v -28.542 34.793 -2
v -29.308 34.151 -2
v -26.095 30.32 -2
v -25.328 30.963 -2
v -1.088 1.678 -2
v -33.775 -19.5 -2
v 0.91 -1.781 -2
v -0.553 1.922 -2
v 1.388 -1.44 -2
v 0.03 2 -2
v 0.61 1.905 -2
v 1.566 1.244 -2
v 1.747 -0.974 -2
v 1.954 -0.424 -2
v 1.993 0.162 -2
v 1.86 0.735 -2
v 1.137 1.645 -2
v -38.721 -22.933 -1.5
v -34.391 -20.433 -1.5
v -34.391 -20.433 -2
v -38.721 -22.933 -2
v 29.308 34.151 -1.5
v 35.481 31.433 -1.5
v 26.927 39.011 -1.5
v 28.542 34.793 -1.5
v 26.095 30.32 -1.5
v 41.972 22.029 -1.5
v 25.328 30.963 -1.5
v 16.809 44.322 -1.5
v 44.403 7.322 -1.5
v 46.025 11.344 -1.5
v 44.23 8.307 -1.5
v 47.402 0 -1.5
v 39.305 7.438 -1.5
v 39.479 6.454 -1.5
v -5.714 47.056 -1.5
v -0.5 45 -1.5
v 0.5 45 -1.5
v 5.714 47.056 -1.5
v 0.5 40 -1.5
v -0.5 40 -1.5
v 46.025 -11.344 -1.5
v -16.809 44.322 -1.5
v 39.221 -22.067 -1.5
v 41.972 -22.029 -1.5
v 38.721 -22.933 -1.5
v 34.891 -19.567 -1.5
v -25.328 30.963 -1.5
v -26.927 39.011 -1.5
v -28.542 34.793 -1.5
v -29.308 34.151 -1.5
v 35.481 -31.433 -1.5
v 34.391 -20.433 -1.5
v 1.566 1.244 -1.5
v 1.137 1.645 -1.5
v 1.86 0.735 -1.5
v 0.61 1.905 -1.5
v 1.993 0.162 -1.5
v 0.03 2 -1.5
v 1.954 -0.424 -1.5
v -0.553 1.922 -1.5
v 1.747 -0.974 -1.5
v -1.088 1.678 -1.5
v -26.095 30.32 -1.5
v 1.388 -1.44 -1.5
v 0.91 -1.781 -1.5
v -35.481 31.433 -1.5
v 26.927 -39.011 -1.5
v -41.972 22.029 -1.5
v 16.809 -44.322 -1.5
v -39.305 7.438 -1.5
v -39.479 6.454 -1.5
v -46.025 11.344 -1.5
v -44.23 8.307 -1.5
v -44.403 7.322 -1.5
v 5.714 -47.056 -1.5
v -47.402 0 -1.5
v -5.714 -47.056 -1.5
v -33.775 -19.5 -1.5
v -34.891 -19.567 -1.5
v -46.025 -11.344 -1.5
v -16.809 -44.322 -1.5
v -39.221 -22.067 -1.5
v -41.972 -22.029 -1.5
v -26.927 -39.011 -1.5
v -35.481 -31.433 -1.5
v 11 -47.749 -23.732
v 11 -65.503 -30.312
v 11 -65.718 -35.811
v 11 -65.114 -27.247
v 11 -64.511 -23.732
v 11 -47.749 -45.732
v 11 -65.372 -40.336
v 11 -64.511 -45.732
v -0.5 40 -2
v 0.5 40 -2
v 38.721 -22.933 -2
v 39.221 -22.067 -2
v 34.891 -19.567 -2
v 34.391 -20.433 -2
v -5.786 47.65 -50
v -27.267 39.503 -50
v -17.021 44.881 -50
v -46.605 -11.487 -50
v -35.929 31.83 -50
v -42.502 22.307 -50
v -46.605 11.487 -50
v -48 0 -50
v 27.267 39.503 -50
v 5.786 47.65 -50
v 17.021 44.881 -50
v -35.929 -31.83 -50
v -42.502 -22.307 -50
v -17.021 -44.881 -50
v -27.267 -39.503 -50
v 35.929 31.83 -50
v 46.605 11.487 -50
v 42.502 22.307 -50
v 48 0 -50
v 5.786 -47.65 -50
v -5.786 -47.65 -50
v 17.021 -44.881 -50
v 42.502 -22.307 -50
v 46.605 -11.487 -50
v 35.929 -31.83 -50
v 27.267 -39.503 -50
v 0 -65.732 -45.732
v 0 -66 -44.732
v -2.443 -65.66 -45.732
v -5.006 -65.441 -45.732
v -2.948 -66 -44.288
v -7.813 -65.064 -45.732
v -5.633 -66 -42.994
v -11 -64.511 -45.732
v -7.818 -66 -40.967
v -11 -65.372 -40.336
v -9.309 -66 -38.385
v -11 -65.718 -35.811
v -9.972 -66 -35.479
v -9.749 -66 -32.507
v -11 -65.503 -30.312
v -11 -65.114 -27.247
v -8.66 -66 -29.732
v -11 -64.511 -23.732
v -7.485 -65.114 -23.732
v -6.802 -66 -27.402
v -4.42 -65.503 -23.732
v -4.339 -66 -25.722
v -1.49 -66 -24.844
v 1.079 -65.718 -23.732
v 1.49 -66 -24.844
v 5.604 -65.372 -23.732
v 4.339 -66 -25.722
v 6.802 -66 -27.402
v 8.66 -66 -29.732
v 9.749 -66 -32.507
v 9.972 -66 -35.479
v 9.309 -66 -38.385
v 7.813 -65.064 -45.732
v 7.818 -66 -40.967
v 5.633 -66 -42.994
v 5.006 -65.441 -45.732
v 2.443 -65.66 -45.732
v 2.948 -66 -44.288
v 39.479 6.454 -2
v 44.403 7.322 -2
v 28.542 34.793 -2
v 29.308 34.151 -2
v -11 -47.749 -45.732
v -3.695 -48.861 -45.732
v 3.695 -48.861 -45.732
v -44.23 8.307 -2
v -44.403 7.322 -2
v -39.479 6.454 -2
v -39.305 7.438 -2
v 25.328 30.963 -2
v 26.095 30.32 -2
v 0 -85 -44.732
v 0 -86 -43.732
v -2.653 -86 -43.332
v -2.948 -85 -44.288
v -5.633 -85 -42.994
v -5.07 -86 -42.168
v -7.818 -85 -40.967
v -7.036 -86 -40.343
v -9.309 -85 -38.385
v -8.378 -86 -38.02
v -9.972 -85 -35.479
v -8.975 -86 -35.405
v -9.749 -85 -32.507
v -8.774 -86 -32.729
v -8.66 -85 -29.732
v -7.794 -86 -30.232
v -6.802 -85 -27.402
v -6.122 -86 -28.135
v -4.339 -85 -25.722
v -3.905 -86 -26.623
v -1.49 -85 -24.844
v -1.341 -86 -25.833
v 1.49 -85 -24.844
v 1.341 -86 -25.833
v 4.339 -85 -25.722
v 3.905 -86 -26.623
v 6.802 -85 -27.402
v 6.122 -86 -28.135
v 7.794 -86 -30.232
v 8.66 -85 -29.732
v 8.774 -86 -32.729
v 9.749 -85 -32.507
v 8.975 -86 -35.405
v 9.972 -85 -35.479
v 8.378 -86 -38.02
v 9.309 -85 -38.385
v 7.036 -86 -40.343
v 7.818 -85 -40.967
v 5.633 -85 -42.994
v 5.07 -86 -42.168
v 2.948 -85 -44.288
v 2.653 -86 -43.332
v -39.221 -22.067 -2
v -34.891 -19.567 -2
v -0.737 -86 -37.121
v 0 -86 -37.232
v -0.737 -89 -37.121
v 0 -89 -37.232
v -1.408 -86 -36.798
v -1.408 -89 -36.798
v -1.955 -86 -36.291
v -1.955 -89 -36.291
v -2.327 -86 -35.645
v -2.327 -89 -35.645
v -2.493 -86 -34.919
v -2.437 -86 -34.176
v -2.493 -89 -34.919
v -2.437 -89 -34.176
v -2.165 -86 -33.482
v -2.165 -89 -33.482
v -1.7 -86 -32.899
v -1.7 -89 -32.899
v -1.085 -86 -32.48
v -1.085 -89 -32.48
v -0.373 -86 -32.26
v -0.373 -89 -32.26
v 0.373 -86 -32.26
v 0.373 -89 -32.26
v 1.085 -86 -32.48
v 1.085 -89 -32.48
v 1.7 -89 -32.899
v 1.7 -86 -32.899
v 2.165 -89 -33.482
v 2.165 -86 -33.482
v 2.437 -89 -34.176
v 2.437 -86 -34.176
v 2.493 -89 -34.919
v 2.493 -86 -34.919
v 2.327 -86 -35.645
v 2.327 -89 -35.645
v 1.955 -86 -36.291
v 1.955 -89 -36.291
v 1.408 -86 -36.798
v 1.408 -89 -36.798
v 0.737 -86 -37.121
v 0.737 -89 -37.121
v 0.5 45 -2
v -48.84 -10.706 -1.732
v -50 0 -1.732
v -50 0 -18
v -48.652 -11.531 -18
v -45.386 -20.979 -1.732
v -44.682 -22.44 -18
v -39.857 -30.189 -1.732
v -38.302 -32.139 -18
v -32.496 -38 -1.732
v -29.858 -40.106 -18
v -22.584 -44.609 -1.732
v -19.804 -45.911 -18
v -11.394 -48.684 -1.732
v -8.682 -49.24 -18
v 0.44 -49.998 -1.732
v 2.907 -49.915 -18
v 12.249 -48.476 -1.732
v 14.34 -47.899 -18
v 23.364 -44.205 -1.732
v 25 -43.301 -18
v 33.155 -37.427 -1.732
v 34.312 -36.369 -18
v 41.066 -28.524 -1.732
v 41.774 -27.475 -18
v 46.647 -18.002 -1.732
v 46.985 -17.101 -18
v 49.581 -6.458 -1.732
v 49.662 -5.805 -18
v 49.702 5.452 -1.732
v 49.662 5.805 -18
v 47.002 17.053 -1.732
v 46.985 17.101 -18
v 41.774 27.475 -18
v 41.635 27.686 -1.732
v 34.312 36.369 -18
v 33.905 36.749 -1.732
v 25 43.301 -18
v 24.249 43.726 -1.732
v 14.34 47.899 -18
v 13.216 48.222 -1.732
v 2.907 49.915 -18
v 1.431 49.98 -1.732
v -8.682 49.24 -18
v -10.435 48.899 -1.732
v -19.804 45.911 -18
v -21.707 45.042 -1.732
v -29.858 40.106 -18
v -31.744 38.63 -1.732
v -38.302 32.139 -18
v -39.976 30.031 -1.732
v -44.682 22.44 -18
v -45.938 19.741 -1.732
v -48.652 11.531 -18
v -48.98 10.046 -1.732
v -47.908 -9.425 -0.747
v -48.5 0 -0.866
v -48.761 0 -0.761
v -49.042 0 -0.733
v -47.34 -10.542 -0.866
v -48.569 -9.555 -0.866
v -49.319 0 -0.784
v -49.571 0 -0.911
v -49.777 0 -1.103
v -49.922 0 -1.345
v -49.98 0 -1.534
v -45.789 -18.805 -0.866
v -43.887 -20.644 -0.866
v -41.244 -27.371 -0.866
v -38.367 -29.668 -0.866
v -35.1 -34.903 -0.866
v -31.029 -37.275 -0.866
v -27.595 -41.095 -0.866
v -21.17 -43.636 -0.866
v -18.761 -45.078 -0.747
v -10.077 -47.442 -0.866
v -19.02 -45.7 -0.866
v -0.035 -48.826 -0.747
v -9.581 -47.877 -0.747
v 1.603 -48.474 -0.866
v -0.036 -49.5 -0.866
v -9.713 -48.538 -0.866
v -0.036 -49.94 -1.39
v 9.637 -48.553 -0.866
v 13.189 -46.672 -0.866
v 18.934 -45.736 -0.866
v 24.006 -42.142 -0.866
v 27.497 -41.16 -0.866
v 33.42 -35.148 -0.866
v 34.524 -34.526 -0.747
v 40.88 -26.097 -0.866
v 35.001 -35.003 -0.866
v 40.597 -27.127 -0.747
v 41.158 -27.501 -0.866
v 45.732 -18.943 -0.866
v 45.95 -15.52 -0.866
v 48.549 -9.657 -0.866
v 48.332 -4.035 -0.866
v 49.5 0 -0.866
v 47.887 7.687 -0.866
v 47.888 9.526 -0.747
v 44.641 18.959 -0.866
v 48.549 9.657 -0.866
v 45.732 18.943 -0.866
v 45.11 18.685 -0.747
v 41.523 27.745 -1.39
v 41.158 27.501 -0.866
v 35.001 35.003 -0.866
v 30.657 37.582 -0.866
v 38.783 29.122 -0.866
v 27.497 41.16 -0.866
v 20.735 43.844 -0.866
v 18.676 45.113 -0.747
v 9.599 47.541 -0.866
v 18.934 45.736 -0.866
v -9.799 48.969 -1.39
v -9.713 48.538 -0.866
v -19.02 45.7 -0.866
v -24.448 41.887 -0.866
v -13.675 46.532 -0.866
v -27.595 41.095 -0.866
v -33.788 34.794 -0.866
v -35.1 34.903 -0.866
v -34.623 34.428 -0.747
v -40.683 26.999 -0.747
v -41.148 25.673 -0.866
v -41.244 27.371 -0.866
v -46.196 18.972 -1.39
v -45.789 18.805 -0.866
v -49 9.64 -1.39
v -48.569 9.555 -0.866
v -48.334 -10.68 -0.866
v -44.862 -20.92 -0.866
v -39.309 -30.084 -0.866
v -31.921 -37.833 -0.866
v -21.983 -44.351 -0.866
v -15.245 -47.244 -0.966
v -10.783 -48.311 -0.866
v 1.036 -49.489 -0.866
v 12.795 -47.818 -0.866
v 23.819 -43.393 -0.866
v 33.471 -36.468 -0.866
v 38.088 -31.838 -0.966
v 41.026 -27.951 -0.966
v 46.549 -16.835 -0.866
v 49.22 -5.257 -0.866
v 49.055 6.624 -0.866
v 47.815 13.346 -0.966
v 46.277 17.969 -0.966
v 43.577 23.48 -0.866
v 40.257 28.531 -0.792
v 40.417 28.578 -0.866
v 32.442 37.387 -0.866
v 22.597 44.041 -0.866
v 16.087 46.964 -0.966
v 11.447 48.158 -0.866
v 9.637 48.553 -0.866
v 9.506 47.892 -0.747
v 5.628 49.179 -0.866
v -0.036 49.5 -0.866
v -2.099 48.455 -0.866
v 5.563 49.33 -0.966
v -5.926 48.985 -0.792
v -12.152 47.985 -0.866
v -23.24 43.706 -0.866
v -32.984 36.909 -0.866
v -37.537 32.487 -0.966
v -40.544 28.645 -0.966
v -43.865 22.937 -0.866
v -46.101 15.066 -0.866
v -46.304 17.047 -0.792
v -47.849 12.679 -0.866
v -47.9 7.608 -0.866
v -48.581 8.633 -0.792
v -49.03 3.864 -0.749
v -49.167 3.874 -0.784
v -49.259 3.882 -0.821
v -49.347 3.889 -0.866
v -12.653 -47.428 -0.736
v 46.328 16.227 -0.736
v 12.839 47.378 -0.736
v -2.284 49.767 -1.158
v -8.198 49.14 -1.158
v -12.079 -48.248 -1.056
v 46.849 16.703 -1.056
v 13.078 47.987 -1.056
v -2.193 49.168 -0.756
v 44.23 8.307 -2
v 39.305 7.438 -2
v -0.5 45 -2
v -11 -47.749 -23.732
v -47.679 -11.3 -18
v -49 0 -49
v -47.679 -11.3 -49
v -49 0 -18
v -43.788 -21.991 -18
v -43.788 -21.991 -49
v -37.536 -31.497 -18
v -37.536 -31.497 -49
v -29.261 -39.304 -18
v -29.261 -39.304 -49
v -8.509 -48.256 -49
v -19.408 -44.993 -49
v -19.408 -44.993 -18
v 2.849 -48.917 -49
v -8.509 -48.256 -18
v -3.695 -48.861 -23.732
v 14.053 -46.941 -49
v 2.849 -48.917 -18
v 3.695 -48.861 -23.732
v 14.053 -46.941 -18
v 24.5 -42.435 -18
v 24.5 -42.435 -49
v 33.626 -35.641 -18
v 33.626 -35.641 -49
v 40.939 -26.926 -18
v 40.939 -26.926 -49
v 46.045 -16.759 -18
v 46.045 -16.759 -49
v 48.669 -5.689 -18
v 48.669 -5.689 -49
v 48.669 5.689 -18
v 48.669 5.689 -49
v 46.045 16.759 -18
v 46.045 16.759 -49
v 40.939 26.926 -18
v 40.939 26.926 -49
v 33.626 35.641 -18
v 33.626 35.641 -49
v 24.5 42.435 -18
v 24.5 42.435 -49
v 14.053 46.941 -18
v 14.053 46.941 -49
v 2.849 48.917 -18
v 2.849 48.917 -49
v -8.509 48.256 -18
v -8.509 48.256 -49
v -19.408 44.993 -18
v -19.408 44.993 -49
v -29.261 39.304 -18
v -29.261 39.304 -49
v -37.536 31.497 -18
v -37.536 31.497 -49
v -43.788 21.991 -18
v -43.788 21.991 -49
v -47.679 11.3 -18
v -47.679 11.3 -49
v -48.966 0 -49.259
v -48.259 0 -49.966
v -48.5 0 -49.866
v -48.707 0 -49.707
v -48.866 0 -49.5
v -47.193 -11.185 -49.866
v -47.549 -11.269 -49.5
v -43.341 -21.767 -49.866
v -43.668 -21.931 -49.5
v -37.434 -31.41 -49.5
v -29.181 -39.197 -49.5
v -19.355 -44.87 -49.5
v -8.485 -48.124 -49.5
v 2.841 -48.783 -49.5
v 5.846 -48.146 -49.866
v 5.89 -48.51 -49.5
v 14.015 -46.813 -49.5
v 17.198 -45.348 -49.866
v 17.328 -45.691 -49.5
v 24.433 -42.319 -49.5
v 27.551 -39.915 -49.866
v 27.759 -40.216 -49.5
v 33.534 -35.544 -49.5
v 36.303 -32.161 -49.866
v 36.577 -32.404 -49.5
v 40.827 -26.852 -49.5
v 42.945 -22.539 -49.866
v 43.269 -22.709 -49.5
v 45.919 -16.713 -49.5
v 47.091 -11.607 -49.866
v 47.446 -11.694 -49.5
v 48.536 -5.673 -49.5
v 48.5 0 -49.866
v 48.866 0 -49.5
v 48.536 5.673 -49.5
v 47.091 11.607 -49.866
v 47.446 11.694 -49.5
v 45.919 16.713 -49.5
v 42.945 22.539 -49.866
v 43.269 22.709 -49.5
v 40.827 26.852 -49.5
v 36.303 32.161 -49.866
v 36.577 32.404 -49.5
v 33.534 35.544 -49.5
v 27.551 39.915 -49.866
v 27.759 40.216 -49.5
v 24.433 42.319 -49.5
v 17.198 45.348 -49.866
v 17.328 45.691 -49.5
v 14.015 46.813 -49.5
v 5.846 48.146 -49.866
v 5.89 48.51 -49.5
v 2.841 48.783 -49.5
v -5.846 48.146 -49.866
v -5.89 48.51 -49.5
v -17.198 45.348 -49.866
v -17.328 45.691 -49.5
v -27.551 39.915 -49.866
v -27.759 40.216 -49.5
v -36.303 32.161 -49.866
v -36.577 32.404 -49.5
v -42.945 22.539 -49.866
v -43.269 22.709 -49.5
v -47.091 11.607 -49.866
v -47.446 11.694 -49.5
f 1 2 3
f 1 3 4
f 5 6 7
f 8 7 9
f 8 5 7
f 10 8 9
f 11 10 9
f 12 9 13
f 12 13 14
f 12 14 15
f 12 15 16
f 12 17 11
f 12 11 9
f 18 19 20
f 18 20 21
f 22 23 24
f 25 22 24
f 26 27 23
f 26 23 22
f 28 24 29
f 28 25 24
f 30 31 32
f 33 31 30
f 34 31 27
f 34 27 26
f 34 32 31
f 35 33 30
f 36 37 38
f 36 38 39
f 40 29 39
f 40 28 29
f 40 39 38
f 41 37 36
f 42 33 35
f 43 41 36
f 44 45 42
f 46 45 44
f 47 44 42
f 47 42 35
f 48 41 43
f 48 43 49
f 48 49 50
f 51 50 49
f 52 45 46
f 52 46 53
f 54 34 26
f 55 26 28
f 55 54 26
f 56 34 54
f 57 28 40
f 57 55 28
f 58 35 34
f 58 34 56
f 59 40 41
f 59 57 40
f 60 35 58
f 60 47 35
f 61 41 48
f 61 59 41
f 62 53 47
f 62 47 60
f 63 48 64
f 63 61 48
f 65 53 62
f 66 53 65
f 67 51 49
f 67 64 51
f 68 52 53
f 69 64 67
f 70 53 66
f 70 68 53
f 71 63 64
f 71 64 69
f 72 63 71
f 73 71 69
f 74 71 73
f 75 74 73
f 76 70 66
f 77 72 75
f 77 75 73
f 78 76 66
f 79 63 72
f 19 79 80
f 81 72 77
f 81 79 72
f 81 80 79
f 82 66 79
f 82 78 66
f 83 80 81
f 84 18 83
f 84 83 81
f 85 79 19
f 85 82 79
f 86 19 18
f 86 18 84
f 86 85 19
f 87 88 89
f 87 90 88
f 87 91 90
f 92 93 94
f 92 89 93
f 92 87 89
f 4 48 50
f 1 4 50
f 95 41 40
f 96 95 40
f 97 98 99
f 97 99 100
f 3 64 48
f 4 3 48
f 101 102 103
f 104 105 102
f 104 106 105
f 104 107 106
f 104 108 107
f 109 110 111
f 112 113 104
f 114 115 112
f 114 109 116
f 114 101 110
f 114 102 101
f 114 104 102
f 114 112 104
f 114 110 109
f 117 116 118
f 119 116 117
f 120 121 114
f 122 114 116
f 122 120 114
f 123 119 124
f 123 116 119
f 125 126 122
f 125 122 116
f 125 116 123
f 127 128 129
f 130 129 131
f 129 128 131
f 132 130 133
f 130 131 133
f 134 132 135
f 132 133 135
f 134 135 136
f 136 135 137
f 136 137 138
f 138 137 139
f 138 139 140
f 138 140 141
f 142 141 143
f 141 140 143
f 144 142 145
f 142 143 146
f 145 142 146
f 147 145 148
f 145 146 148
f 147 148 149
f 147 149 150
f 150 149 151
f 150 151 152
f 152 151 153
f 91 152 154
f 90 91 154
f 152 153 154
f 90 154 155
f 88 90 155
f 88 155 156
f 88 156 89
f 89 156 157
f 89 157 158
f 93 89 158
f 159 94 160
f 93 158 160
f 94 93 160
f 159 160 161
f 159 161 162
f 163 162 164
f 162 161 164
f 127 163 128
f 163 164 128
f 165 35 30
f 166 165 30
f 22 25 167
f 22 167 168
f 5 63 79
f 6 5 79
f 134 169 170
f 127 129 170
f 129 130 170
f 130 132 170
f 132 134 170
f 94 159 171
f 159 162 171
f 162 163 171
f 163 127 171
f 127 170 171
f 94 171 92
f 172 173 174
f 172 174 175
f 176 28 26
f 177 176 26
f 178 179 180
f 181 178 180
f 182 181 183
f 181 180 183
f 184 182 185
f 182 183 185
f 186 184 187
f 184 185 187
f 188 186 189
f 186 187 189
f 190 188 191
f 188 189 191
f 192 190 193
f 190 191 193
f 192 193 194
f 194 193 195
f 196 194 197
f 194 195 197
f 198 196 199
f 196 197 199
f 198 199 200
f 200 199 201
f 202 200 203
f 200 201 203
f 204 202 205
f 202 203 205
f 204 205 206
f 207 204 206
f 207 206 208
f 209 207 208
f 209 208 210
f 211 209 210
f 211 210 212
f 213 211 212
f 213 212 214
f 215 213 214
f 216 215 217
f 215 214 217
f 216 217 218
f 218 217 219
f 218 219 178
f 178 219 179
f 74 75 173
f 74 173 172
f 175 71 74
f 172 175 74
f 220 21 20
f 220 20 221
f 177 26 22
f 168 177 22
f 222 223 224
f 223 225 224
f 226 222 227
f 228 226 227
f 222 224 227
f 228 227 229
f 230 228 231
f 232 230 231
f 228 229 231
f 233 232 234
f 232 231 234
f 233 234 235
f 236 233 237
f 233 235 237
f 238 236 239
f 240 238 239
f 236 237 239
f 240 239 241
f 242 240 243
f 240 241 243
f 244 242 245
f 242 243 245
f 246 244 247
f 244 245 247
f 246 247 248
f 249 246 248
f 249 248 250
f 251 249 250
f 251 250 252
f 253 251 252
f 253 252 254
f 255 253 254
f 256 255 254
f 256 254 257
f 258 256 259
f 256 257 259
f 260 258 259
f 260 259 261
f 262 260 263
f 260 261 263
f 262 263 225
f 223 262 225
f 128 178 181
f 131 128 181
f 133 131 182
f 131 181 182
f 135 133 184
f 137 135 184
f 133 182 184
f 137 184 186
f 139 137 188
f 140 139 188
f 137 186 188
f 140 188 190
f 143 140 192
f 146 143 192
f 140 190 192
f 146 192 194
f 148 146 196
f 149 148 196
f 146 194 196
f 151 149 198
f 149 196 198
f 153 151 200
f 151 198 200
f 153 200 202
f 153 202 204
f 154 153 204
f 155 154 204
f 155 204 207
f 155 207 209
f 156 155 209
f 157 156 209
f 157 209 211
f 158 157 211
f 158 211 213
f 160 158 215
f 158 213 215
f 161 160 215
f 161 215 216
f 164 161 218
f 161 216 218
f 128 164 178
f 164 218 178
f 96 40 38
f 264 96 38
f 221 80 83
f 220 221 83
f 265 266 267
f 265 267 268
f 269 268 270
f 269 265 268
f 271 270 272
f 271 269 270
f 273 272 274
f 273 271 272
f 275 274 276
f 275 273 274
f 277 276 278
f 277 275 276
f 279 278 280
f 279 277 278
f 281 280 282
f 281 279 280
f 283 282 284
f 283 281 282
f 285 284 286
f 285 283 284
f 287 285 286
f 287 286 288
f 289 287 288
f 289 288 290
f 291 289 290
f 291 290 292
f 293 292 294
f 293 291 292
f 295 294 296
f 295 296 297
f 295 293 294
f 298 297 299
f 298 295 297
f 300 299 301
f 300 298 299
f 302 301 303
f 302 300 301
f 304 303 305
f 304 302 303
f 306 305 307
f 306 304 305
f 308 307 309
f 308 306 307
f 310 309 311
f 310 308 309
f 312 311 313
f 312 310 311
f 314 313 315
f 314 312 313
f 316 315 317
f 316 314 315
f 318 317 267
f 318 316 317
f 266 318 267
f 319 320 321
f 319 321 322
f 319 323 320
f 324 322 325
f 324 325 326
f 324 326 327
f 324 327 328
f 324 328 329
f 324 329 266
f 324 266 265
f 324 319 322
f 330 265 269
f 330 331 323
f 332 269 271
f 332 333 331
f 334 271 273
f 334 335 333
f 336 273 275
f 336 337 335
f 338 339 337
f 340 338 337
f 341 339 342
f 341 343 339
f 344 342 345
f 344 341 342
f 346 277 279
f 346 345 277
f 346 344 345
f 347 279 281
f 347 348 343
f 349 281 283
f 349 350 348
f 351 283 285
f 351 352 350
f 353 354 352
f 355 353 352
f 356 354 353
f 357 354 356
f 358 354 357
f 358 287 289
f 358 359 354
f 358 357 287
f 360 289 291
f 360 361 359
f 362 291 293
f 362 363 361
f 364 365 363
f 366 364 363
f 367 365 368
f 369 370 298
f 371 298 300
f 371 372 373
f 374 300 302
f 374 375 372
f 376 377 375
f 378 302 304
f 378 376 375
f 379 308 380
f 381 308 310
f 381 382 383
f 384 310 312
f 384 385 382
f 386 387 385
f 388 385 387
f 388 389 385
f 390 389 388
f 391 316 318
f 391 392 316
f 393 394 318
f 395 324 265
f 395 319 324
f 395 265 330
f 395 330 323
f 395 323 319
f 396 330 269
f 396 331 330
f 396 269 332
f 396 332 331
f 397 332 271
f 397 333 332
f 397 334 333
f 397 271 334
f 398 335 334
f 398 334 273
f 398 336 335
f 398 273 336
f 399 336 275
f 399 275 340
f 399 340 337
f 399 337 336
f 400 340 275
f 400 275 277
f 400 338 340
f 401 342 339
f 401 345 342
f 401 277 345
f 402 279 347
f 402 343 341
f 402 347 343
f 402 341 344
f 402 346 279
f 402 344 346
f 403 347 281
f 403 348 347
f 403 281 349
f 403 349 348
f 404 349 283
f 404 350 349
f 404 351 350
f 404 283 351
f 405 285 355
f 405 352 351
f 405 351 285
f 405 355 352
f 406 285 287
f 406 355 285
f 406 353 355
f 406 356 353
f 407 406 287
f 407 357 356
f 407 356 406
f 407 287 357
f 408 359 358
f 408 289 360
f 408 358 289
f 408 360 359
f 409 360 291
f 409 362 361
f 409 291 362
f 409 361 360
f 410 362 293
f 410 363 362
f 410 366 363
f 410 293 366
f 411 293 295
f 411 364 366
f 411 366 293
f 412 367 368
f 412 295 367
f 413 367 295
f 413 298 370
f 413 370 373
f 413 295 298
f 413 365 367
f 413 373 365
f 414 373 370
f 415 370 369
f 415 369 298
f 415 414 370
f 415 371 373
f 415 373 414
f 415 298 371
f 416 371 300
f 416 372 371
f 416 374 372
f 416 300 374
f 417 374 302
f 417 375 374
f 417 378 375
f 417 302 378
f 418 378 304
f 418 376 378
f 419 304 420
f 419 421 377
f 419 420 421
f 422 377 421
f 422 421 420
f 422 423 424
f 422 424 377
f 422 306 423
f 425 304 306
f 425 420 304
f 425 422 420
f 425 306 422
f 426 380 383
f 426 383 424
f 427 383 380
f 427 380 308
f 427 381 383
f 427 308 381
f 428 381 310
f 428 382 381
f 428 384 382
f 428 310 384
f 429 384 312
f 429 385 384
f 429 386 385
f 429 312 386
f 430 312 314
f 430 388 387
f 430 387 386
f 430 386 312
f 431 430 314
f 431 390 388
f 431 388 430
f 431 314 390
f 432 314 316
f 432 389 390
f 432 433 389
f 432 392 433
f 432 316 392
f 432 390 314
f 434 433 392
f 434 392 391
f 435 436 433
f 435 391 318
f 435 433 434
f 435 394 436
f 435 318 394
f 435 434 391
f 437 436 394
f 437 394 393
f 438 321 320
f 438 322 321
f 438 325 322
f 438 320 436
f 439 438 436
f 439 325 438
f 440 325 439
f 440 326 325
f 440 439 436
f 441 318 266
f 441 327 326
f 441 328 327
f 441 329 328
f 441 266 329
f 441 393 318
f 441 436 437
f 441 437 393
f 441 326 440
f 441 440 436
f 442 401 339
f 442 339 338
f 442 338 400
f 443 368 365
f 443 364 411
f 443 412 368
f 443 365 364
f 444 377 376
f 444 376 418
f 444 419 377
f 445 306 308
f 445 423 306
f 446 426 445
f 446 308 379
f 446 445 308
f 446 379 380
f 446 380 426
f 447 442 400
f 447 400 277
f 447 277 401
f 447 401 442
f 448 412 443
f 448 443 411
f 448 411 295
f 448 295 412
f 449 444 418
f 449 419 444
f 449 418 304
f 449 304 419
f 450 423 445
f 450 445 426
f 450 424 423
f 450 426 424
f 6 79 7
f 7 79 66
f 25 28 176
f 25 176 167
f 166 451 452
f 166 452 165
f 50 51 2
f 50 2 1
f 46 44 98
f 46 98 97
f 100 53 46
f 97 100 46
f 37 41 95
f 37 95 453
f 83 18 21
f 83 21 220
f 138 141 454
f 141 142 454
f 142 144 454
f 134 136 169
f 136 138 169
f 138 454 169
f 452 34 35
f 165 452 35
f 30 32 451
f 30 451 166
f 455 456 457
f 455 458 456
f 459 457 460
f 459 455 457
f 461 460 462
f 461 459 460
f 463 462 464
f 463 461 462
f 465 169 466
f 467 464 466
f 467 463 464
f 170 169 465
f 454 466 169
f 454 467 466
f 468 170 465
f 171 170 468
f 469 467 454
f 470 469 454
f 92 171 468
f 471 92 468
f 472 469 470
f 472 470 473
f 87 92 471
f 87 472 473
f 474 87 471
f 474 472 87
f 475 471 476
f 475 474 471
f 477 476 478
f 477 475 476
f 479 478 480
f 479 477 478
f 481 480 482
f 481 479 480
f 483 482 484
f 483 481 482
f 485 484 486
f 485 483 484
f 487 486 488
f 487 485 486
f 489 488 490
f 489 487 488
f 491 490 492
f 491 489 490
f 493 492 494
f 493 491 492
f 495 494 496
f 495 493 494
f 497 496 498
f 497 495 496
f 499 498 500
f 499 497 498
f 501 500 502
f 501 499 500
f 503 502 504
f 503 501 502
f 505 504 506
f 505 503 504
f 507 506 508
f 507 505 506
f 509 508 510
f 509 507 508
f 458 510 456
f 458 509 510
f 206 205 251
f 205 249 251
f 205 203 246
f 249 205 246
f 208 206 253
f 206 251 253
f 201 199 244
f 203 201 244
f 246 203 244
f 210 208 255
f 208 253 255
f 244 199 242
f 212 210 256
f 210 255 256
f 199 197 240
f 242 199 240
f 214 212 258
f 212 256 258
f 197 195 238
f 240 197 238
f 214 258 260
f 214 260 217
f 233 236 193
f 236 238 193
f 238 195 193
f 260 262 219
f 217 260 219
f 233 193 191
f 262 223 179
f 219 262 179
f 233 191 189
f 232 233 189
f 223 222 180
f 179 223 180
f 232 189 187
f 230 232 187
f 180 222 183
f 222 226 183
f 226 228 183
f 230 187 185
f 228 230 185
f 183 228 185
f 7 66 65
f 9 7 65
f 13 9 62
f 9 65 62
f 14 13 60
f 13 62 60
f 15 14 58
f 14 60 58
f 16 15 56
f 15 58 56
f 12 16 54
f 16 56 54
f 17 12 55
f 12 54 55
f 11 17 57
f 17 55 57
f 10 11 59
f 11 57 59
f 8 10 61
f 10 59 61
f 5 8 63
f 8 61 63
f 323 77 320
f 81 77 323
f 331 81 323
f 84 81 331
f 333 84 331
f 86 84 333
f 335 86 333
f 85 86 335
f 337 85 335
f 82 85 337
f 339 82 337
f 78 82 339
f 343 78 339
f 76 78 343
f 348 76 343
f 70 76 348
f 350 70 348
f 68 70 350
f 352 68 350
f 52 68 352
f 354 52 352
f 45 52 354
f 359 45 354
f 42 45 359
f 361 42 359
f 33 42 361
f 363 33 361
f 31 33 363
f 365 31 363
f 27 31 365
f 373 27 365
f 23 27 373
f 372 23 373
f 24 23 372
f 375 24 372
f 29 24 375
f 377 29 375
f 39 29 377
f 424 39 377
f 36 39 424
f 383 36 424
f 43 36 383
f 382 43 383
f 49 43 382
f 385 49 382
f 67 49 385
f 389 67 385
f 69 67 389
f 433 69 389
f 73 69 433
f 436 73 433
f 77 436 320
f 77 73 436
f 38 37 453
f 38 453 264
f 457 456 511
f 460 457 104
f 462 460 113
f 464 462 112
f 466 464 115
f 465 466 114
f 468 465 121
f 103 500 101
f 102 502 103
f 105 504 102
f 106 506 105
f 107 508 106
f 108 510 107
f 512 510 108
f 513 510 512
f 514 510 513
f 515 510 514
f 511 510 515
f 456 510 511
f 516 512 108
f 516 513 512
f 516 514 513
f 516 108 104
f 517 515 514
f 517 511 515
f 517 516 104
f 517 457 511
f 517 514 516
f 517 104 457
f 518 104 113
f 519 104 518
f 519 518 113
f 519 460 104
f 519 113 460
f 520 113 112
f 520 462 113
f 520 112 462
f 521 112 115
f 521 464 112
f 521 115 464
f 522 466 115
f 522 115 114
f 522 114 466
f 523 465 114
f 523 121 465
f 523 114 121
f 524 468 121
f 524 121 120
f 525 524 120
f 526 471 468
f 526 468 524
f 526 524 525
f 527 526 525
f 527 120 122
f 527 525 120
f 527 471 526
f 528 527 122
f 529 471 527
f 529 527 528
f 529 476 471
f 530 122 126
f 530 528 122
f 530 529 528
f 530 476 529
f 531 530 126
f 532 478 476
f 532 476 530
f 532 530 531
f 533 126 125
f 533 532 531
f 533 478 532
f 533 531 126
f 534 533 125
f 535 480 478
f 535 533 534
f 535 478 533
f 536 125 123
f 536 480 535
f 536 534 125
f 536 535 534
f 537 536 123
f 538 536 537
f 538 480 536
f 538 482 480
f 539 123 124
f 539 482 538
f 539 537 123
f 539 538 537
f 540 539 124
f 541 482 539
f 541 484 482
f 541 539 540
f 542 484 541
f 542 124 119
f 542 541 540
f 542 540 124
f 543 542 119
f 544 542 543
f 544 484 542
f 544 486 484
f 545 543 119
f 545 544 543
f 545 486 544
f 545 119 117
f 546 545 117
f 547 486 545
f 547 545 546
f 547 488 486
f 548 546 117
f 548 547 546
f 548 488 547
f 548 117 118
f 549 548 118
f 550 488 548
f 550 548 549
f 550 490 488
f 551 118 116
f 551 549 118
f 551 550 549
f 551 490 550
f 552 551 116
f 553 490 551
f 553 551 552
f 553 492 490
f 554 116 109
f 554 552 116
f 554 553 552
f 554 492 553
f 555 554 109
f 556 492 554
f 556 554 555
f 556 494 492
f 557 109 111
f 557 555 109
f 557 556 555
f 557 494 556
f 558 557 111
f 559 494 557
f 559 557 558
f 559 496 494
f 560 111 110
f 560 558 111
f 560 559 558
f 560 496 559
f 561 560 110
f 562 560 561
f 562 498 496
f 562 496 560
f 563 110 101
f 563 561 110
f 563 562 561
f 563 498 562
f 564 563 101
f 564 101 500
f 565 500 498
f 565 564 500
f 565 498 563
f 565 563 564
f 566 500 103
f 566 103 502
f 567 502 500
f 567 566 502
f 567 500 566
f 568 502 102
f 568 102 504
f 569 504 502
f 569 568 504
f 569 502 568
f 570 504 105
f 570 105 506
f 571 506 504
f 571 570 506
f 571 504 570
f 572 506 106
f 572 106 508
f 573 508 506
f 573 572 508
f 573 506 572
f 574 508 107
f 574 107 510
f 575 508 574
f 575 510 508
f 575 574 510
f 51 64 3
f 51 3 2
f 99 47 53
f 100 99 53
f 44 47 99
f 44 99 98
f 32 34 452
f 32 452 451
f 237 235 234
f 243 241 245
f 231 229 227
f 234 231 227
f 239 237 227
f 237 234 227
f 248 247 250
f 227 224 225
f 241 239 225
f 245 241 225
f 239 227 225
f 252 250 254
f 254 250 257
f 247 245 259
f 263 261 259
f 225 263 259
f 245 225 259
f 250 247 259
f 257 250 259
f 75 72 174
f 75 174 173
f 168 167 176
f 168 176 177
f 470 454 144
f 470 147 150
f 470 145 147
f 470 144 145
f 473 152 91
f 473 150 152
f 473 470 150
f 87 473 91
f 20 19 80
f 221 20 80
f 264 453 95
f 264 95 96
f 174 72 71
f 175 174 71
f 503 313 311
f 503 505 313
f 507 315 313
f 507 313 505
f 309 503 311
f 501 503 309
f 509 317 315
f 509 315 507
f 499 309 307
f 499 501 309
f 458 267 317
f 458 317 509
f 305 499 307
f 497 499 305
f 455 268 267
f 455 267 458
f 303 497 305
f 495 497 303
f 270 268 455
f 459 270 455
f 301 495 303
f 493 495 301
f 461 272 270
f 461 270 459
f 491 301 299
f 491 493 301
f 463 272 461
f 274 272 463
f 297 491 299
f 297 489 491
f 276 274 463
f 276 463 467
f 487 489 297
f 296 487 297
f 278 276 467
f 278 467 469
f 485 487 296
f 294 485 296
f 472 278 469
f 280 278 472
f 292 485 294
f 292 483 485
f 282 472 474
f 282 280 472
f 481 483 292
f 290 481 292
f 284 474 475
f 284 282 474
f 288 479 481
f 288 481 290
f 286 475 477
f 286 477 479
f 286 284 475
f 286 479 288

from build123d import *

# Parameters (mm, degrees)
ZAOBLIT1_R               = 1
SKICA2_W                 = 1
SKICA2_H                 = 5
ODEBRAT_VYSUNUT_M1_DEPTH = 0.5
KRUHOV_POLE1_COUNT       = 9
ODEBRAT_VYSUNUT_M2_DEPTH = 0.5
SKICA4_W                 = 22
SKICA4_H                 = 22
P_IDAT_VYSUNUT_M1_DEPTH  = 89
ZKOSEN_1_SIZE            = 1


with BuildPart() as part:
    # Skica1 → Rotovat1 (revolve)
    with BuildSketch(Plane(origin=(0, 0, 0), x_dir=(0, 0, -1), z_dir=(1, 0, 0)), mode=Mode.PRIVATE) as rotovat1_sk:
        Polygon((0, 50), (1.5, 47.401923789), (1.5, 0), (50, 0), (50, 49), (18, 49), (18, 50), align=None)
    revolve(rotovat1_sk.sketch.rotate(Axis((0, 0, 0), (0, 0, 1)), 90), axis=Axis((0, 0, 0), (0, 0, 1)))  # turned: the seam where the file's is

    # Zaoblit1
    zaoblit1_edges = [part.edges().sort_by_distance(p)[0] for p in [
        (50, 0, 0),
        (49, 0, -50),
    ]]
    fillet(zaoblit1_edges, radius=ZAOBLIT1_R)

    # Skica2 → Odebrat vysunutím1 (cut)
    with BuildSketch(Plane.XY.offset(-1.5)):
        with Locations((0, 42.5)):
            Rectangle(SKICA2_W, SKICA2_H)
    odebrat_vysunut_m1 = extrude(amount=-ODEBRAT_VYSUNUT_M1_DEPTH, mode=Mode.SUBTRACT)

    # Kruhové pole1: Odebrat vysunutím1 ×9 about axis, 2 skipped
    kruhov_pole1_axis = Axis((0, 0, 0), (0, 0, -1))
    add([odebrat_vysunut_m1.rotate(kruhov_pole1_axis, i * 360 / KRUHOV_POLE1_COUNT) for i in range(1, KRUHOV_POLE1_COUNT) if i not in (4, 5)], mode=Mode.SUBTRACT)

    # Skica3 → Odebrat vysunutím2 (cut)
    with BuildSketch(Plane.XY.offset(-1.5)):
        with BuildLine():
            Line((-1.087507328, 1.678489741), (-33.774990748, -19.5))
            Line((-33.774990748, -19.5), (0.909861092, -1.781053844))
            ThreePointArc((0.909861092, -1.781053844), (1.732050808, 1), (-1.087507328, 1.678489741))
        make_face()
    extrude(amount=-ODEBRAT_VYSUNUT_M2_DEPTH, mode=Mode.SUBTRACT)

    # Skica4 → Přidat vysunutím1 (add)
    with BuildSketch(Plane(origin=(0, 0, 0), x_dir=(1, 0, 0), z_dir=(0, 1, 0))):
        with Locations((0, 34.732050808)):
            Rectangle(SKICA4_W, SKICA4_H)
    extrude(amount=-P_IDAT_VYSUNUT_M1_DEPTH)

    # Skica5 → Odebrat rotací1 (revolve, cut)
    with BuildSketch(Plane(origin=(0, 0, 0), x_dir=(0, 0, -1), z_dir=(1, 0, 0)), mode=Mode.PRIVATE) as odebrat_rotac_1_sk:
        Polygon((3.732050808, -60.373066959), (24.732050808, -66), (24.732050808, -86), (32.232050808, -86), (32.232050808, -89), (3.732050808, -89), align=None)
    revolve(odebrat_rotac_1_sk.sketch.rotate(Axis((0, -89, -34.732050808), (0, 1, 0)), 180), axis=Axis((0, -89, -34.732050808), (0, 1, 0)), mode=Mode.SUBTRACT)  # turned: the seam where the file's is

    # Zkosení1
    zkosen_1_edges = [part.edges().sort_by_distance(p)[0] for p in [
        (0, -86, -24.732050808),
    ]]
    chamfer(zkosen_1_edges, length=ZKOSEN_1_SIZE)


solid = part.part
